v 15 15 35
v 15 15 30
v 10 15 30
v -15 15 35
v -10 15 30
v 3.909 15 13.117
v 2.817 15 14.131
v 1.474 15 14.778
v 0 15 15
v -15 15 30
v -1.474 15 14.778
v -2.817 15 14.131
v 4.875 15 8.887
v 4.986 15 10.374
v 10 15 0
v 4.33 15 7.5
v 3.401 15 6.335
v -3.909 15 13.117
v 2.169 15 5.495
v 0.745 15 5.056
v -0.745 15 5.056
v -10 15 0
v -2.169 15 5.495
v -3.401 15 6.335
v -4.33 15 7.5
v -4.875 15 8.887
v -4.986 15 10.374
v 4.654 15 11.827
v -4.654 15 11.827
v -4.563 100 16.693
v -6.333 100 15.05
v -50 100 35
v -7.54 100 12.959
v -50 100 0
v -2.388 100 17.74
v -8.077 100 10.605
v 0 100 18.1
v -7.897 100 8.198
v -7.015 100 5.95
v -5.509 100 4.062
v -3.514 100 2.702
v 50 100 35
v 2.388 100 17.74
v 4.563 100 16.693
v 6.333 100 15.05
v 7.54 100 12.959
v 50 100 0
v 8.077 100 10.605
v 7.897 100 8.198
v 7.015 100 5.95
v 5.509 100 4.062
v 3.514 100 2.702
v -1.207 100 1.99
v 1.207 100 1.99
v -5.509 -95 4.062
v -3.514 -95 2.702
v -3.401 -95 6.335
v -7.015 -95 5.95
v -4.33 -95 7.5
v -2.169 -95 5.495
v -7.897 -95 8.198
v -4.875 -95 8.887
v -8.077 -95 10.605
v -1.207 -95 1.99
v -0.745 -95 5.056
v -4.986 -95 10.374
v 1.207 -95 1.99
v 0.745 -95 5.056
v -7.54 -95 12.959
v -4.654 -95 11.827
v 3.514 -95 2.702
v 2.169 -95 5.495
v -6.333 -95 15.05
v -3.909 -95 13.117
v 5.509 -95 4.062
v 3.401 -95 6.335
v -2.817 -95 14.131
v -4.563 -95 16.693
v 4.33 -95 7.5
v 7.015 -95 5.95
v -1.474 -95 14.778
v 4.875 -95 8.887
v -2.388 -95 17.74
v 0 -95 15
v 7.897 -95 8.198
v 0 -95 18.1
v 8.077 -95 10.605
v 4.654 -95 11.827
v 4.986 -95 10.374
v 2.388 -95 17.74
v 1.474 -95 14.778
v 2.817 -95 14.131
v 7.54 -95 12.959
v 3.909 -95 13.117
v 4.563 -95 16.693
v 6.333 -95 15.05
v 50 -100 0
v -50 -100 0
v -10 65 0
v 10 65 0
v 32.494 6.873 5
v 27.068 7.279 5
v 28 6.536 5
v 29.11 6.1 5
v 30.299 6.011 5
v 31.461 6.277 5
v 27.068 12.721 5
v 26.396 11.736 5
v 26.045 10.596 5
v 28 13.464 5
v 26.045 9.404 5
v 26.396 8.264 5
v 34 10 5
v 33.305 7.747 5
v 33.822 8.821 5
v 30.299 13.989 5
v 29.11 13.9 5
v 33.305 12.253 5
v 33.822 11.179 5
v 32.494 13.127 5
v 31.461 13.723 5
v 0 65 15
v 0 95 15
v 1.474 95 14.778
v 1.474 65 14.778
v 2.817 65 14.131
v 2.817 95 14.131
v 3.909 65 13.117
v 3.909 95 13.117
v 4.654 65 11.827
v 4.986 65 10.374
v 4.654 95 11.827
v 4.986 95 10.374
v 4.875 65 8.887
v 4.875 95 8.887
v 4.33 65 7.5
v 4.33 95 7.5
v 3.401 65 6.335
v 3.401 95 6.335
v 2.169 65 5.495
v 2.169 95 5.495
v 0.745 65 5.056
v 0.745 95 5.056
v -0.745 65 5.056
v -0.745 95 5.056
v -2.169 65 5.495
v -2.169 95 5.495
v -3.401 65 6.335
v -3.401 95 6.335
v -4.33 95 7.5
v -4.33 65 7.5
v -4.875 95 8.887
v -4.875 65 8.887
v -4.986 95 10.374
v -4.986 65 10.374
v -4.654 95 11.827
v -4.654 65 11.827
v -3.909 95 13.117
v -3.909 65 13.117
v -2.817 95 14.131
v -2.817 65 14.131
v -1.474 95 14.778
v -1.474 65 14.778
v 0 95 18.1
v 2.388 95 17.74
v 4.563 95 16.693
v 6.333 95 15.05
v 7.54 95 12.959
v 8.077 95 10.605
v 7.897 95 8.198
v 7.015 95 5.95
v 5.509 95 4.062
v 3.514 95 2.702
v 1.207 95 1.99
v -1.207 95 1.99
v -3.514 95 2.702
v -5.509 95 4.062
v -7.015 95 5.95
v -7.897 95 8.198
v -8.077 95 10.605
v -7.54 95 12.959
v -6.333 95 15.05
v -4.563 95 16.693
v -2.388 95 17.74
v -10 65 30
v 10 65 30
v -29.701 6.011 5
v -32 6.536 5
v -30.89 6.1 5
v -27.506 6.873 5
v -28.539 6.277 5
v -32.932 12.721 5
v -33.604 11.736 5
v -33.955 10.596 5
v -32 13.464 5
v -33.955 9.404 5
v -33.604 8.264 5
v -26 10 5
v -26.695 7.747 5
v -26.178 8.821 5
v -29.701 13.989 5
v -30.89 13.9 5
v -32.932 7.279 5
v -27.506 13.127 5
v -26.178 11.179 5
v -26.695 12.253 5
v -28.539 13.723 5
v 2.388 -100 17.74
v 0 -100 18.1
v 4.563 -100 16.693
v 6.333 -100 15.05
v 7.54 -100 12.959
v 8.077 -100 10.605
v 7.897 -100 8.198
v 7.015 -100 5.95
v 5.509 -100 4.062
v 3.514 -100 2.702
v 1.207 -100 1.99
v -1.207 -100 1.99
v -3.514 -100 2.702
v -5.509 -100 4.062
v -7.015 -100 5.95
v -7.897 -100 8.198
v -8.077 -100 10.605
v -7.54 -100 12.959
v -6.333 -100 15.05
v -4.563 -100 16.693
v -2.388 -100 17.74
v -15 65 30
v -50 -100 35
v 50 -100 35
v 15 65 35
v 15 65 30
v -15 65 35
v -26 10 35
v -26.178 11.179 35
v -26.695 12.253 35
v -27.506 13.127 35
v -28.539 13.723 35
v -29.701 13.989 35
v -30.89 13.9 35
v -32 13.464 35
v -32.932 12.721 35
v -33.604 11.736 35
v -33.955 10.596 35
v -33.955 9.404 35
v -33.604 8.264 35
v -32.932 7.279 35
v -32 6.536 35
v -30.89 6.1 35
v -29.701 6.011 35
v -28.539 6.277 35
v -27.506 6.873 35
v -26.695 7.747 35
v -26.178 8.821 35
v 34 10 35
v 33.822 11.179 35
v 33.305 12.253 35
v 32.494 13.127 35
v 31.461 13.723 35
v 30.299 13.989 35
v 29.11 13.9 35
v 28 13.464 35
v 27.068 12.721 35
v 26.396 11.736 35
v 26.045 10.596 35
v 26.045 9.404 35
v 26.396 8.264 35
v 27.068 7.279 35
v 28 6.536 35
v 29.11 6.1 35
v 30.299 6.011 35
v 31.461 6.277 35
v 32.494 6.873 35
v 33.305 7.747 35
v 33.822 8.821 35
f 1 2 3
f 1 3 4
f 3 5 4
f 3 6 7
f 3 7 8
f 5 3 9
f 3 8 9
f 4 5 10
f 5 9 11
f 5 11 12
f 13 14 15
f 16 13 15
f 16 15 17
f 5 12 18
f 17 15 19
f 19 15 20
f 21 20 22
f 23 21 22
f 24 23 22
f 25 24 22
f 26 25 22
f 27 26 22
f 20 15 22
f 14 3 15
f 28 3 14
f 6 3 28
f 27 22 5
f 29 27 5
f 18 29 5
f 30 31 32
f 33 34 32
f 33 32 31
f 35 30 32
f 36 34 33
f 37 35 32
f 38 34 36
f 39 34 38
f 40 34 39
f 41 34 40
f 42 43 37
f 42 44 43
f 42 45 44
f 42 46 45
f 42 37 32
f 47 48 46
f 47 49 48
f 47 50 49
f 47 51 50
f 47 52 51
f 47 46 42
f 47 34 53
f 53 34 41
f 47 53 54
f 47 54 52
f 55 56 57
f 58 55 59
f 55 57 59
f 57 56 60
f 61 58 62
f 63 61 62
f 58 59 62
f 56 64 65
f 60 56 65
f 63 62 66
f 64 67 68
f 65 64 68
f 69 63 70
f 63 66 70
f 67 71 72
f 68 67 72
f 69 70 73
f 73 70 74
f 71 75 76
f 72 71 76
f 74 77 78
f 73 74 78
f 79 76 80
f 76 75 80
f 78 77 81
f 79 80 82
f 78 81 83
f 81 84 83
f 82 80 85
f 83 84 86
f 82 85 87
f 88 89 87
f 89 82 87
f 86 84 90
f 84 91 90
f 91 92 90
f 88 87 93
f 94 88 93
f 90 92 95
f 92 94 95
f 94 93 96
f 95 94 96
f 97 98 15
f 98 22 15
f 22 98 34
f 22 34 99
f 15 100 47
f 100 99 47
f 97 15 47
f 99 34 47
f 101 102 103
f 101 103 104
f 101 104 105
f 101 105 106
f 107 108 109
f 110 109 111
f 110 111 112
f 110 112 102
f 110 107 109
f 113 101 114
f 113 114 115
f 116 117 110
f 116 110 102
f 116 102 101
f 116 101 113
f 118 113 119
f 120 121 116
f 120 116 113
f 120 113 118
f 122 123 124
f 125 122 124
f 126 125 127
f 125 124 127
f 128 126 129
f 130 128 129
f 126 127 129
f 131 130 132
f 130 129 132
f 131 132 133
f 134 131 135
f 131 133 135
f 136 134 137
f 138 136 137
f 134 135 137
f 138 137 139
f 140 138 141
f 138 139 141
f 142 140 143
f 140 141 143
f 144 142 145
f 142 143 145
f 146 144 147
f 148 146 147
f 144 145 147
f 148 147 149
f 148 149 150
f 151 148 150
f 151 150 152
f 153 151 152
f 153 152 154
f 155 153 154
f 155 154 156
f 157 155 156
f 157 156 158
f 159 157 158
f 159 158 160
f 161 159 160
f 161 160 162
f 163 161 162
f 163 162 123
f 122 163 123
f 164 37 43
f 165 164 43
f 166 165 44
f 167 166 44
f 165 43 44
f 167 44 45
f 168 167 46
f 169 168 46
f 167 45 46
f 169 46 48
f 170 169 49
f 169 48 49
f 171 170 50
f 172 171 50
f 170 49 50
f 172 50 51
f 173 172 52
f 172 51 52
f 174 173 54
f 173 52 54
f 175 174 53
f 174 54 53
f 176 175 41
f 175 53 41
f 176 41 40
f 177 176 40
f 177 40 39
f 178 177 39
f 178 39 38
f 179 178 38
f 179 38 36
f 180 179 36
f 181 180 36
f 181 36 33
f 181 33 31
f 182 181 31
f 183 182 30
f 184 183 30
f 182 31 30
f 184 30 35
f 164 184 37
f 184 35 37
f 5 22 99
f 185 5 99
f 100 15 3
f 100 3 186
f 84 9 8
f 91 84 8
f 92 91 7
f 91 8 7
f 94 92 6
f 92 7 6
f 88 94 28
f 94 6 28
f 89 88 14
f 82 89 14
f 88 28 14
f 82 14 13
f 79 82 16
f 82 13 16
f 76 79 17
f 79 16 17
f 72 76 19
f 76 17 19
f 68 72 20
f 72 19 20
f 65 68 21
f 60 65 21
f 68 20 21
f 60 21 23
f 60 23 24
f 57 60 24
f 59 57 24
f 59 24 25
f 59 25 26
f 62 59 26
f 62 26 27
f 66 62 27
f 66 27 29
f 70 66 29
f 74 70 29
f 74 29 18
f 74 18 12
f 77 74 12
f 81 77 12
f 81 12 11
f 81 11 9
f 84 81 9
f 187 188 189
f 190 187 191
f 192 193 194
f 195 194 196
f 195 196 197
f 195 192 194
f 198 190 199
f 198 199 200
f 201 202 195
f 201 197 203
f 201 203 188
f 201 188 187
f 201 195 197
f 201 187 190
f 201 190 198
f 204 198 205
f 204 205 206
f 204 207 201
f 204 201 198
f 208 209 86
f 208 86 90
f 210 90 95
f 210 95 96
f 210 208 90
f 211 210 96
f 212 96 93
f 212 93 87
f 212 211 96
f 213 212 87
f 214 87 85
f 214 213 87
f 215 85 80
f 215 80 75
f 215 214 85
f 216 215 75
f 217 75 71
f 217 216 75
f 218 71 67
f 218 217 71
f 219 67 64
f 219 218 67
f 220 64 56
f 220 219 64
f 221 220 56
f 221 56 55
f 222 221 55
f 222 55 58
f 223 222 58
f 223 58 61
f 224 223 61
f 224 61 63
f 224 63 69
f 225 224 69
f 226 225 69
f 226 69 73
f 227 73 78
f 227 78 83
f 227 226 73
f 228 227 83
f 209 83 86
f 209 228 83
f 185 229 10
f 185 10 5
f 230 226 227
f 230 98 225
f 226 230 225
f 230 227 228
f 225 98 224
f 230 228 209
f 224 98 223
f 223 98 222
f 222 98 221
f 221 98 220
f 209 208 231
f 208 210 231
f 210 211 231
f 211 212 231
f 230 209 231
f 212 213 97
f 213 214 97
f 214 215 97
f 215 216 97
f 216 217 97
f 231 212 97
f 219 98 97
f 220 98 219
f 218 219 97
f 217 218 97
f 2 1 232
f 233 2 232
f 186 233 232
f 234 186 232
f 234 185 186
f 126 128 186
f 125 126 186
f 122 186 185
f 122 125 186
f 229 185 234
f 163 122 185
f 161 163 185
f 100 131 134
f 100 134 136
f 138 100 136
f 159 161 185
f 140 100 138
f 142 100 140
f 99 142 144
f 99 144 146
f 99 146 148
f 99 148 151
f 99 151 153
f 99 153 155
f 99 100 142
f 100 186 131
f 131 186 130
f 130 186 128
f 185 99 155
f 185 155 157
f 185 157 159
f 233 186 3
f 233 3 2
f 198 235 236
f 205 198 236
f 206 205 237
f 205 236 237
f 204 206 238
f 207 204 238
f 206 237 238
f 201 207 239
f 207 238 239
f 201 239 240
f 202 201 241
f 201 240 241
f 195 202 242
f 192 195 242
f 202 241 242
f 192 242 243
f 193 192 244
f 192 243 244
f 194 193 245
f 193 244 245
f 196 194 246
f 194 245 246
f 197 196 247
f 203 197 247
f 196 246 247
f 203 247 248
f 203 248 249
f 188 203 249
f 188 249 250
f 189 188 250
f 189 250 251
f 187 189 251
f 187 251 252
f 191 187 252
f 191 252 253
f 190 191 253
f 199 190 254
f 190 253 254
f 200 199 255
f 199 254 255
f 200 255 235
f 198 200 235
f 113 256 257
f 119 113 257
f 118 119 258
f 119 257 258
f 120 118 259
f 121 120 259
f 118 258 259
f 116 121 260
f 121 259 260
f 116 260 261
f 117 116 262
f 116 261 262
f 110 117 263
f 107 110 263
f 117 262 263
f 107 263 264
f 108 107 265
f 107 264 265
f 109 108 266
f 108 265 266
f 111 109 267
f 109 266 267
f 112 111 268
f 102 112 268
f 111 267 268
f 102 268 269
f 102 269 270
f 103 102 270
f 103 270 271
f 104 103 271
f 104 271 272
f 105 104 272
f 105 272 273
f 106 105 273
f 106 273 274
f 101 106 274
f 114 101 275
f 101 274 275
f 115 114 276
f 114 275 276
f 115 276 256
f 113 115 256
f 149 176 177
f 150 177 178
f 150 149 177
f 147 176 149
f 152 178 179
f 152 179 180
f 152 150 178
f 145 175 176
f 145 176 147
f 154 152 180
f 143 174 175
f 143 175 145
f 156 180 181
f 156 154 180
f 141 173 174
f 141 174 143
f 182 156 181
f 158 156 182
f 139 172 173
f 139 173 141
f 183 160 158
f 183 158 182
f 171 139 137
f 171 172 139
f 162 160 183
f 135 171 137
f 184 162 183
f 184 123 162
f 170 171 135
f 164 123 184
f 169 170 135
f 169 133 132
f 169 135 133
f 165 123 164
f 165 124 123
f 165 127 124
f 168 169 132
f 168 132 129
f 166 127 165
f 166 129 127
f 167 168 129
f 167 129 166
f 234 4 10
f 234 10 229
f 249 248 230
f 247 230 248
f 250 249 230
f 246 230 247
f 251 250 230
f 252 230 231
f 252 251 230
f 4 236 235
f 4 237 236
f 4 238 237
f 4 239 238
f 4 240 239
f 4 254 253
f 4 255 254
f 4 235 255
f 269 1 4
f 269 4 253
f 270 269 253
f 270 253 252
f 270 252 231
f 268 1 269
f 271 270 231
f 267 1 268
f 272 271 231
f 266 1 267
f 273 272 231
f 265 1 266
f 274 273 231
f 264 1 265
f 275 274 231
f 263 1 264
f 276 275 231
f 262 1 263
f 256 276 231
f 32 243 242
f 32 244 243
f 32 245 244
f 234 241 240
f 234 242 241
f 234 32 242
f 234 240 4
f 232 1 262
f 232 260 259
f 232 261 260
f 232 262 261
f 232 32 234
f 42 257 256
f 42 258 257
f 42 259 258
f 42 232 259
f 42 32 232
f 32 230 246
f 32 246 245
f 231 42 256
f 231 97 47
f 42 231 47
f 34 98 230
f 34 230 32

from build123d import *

# Parameters (mm, degrees)
SKETCH1_W           = 100
SKETCH1_H           = 200
BOSS_EXTRUDE1_DEPTH = 35
SKETCH2_R           = 4
CUT_EXTRUDE1_DEPTH  = 30
SKETCH3_R           = 5
CUT_EXTRUDE2_DEPTH  = 210.105236663
SKETCH4_W           = 20
SKETCH4_H           = 50
CUT_EXTRUDE3_DEPTH  = 118.153745139
SKETCH6_R           = 8.1
CUT_EXTRUDE4_DEPTH  = 5
SKETCH7_W           = 30
SKETCH7_H           = 50
CUT_EXTRUDE5_DEPTH  = 5


with BuildPart() as part:
    # Sketch1 → Boss-Extrude1 (new body)
    with BuildSketch(Plane.XY):
        Rectangle(SKETCH1_W, SKETCH1_H)
    extrude(amount=BOSS_EXTRUDE1_DEPTH)

    # Sketch2 → Cut-Extrude1 (cut)
    with BuildSketch(Plane.XY.offset(35)):
        with Locations((-30, 10)):
            Circle(SKETCH2_R)
        with Locations((30, 10)):
            Circle(SKETCH2_R)
    extrude(amount=-CUT_EXTRUDE1_DEPTH, mode=Mode.SUBTRACT)

    # Sketch3 → Cut-Extrude2 (cut, through all)
    with BuildSketch(Plane(origin=(0, 100, 0), x_dir=(1, 0, 0), z_dir=(0, 1, 0))):
        with Locations(Location((0, -10, 0), (0, 0, 270))):
            Circle(SKETCH3_R)
    extrude(amount=-CUT_EXTRUDE2_DEPTH, mode=Mode.SUBTRACT)

    # Sketch4 → Cut-Extrude3 (cut, through all)
    with BuildSketch(Plane(origin=(0, 0, 0), x_dir=(-1, 0, 0), z_dir=(0, 0, -1))):
        with Locations((0, 40)):
            Rectangle(SKETCH4_W, SKETCH4_H)
    extrude(amount=-CUT_EXTRUDE3_DEPTH, mode=Mode.SUBTRACT)

    # Sketch6 → Cut-Extrude4 (cut)
    with BuildSketch(Plane(origin=(0, 100, 0), x_dir=(1, 0, 0), z_dir=(0, 1, 0))):
        with Locations(Location((0, -10, 0), (0, 0, 270))):
            Circle(SKETCH6_R)
    cut_extrude4 = extrude(amount=-CUT_EXTRUDE4_DEPTH, mode=Mode.SUBTRACT)

    # Mirror1: Cut-Extrude4 across plane
    add(cut_extrude4.mirror(Plane.ZX), mode=Mode.SUBTRACT)

    # Sketch7 → Cut-Extrude5 (cut)
    with BuildSketch(Plane.XY.offset(35)):
        with Locations((0, 40)):
            Rectangle(SKETCH7_W, SKETCH7_H)
    extrude(amount=-CUT_EXTRUDE5_DEPTH, mode=Mode.SUBTRACT)


solid = part.part
